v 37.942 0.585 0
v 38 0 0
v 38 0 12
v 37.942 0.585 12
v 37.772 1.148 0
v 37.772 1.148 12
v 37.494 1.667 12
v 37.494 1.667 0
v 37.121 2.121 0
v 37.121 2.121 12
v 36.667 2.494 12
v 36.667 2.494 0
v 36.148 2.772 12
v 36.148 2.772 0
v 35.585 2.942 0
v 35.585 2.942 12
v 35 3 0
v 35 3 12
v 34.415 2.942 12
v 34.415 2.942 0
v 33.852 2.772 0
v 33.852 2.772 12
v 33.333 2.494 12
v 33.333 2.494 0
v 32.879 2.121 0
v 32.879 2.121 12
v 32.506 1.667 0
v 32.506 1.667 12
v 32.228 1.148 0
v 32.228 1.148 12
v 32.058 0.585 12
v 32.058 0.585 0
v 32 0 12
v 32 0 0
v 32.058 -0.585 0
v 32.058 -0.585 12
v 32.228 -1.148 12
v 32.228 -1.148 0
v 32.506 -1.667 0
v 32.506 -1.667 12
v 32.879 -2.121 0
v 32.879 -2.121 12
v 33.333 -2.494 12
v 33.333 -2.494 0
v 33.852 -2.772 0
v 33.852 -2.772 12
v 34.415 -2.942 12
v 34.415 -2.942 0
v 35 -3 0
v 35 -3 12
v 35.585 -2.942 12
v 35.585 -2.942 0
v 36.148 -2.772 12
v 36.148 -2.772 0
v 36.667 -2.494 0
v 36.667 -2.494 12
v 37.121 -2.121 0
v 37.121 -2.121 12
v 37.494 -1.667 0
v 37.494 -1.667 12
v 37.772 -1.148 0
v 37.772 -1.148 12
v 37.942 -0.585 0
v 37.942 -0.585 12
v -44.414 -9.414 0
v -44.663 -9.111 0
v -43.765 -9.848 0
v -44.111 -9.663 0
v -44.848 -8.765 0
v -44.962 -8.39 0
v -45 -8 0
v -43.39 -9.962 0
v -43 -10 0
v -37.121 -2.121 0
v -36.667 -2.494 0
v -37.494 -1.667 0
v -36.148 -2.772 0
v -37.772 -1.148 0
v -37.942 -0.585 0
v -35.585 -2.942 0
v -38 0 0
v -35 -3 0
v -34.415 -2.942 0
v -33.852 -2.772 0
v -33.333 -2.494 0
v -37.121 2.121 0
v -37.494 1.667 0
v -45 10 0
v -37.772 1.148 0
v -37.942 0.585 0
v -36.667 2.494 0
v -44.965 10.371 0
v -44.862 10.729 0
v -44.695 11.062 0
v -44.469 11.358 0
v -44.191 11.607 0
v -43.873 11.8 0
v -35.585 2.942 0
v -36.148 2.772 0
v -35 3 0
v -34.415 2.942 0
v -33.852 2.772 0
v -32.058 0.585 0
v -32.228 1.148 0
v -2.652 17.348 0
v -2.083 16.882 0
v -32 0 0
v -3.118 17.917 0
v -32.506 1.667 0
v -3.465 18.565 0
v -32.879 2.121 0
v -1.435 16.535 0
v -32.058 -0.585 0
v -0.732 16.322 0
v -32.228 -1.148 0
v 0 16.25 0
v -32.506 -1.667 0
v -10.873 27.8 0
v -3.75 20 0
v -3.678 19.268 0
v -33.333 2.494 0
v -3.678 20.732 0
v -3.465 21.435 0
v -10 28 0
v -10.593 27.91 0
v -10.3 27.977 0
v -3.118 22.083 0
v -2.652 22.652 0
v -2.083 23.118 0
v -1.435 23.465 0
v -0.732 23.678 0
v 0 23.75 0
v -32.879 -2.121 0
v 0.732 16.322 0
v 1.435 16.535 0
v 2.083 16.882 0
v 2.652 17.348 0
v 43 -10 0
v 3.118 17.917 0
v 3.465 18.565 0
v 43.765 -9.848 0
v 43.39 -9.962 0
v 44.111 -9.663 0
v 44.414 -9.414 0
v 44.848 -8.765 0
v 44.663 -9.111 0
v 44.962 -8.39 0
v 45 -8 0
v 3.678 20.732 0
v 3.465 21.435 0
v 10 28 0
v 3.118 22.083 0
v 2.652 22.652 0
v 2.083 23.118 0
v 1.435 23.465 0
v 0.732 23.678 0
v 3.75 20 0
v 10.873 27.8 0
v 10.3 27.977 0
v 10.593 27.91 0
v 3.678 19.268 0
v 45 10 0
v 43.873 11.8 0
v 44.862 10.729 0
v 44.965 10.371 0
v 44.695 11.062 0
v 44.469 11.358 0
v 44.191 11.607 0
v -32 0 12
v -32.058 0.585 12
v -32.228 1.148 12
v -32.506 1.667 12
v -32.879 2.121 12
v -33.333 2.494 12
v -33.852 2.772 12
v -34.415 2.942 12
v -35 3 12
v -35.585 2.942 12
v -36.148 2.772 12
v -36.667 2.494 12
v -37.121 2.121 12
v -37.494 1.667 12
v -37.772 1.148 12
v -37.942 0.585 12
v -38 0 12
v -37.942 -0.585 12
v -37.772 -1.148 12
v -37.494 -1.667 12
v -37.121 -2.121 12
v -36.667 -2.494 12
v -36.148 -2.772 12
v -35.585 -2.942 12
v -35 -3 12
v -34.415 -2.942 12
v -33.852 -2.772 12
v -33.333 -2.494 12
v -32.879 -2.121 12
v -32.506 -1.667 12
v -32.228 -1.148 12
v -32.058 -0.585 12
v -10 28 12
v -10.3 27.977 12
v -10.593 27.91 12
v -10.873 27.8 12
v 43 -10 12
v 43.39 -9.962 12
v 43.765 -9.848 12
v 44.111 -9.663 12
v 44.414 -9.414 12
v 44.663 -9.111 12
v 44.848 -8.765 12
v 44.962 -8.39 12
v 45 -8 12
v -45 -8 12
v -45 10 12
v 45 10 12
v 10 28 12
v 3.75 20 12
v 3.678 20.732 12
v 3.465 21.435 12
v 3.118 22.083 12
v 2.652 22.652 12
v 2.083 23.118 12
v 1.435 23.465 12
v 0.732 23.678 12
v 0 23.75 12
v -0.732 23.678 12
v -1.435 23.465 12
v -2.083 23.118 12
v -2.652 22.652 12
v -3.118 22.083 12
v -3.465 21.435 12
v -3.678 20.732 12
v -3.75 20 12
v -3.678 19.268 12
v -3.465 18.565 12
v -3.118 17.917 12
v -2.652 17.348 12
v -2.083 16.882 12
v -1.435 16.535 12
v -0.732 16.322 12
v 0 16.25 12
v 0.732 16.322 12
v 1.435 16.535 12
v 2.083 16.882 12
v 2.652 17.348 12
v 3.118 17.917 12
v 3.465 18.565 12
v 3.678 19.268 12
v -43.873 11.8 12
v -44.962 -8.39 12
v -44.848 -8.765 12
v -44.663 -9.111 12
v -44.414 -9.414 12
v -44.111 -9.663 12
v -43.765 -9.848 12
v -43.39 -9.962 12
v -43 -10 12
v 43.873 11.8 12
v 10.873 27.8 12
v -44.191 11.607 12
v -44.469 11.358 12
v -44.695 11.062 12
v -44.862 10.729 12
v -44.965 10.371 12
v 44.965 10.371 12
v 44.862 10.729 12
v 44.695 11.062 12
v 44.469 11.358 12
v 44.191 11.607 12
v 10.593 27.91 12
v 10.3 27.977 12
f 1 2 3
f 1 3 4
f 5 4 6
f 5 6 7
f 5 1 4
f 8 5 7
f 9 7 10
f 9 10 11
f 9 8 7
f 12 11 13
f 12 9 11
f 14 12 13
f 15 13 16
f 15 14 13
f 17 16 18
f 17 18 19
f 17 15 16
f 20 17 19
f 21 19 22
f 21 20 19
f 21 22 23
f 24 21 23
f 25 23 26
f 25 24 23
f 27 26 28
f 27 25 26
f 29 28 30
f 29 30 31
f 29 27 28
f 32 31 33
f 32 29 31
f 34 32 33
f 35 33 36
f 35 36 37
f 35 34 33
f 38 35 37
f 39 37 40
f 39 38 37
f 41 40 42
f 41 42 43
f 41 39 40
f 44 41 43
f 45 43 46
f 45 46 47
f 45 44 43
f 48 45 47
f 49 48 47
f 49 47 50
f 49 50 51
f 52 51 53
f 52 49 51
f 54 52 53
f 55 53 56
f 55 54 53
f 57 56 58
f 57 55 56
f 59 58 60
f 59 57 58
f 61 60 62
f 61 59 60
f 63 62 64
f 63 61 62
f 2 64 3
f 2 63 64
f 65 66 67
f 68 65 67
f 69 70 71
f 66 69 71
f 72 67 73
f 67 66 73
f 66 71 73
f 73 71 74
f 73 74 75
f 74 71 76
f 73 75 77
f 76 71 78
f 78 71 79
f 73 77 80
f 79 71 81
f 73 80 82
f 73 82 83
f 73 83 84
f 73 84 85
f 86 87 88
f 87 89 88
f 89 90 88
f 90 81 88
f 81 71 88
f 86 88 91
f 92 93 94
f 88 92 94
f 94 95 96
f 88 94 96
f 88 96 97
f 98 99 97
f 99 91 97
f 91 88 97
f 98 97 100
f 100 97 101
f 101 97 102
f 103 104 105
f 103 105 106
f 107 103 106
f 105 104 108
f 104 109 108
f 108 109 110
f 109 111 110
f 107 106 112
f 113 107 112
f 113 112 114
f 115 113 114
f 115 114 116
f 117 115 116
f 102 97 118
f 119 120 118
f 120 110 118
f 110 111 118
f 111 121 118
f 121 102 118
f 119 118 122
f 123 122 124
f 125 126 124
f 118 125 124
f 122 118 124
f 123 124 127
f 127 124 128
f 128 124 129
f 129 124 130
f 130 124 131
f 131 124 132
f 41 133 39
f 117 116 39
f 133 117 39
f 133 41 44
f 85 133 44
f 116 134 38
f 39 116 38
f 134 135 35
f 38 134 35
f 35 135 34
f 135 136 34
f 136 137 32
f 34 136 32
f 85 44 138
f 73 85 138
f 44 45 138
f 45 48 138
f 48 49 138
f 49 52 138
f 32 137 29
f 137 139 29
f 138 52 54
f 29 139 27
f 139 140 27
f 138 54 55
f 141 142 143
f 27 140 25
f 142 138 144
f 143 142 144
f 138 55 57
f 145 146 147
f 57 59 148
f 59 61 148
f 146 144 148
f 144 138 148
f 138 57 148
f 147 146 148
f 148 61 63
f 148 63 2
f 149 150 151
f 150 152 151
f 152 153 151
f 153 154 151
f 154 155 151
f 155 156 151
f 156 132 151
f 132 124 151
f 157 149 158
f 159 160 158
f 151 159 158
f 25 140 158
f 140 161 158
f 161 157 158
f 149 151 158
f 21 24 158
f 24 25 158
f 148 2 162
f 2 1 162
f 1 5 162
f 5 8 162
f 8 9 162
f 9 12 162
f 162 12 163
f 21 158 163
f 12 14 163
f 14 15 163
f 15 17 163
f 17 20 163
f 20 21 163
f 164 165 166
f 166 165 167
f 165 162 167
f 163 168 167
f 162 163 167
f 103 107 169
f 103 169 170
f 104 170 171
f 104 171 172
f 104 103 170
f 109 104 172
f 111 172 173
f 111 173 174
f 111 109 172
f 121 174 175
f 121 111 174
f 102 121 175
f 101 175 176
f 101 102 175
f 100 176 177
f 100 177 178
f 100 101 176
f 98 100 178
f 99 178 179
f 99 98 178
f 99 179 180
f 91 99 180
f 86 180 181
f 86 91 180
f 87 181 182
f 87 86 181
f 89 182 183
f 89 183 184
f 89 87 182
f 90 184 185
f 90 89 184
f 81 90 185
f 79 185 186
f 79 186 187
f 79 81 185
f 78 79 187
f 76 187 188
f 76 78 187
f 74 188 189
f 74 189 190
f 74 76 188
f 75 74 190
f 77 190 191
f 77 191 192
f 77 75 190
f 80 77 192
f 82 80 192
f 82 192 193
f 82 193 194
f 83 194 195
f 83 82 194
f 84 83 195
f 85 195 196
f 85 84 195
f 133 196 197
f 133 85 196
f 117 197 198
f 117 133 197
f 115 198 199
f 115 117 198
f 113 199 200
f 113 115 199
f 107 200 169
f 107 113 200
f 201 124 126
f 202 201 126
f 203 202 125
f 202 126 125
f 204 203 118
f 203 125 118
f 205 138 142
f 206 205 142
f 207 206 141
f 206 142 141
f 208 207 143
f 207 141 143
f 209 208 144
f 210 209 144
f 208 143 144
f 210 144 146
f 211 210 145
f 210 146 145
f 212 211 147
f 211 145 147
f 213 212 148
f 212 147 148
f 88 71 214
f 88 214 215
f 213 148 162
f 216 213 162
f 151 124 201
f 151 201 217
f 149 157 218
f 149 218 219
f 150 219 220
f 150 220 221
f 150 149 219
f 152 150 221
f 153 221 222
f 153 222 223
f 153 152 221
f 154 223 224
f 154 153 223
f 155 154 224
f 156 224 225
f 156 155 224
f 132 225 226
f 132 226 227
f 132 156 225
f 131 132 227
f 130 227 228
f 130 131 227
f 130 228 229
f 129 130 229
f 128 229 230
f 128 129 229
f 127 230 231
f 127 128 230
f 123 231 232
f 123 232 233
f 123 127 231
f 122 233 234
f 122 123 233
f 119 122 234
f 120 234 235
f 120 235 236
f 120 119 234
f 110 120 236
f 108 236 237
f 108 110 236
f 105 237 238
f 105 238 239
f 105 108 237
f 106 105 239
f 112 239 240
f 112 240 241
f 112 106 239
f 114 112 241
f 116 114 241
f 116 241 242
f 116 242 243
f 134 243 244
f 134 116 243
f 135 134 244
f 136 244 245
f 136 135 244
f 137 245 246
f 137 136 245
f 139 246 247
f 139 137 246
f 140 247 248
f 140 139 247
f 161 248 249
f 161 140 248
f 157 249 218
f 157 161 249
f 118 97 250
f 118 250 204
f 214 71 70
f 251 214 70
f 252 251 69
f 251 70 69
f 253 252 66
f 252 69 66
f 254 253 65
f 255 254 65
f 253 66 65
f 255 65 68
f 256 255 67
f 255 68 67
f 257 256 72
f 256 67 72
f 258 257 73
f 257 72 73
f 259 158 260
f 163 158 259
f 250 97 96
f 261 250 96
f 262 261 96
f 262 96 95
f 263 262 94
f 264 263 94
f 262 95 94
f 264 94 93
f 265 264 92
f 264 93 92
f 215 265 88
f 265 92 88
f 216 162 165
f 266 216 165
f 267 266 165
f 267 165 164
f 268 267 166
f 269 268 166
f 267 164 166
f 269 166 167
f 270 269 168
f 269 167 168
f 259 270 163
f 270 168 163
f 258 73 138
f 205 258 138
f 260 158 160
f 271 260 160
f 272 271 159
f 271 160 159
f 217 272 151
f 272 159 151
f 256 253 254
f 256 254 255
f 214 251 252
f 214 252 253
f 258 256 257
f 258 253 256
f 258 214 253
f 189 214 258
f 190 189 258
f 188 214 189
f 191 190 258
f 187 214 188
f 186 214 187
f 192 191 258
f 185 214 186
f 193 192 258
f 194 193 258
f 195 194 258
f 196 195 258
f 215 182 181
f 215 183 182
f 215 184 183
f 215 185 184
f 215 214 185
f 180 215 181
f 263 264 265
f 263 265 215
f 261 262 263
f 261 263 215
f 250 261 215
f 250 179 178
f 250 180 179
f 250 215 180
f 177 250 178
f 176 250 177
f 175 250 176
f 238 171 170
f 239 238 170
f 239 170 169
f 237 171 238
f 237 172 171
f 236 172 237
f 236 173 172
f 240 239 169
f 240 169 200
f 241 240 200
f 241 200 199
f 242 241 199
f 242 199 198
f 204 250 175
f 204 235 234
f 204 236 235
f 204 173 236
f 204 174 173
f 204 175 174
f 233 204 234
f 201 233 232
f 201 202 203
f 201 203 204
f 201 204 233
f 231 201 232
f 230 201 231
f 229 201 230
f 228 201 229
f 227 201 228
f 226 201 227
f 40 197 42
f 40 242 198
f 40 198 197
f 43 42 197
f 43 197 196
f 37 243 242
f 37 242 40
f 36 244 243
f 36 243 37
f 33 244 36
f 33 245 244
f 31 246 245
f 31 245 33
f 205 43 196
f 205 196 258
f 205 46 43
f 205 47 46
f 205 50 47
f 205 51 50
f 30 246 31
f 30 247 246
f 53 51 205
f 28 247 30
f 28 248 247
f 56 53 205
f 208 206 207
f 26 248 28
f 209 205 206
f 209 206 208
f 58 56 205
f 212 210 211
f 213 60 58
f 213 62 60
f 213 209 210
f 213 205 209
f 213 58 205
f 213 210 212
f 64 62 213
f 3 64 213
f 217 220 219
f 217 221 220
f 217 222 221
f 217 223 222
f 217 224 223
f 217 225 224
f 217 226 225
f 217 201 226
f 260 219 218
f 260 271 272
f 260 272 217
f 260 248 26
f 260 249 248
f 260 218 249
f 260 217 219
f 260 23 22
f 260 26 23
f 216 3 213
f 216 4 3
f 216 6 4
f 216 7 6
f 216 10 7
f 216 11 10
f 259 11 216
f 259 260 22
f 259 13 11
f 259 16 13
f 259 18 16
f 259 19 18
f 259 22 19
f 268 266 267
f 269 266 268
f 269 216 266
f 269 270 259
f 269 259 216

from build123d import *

# Parameters (mm, degrees)
SKETCH_R   = 3
SKETCH_R_2 = 3.75
PAD_DEPTH  = 12


with BuildPart() as part:
    # Sketch → Pad (new body)
    with BuildSketch(Plane.XY):
        with BuildLine():
            Line((-43, -10), (43, -10))
            ThreePointArc((43, -10), (44.414214, -9.414214), (45, -8))
            Line((45, -8), (45, 10))
            ThreePointArc((45, 10), (44.694859, 11.061816), (43.872547, 11.799628))
            Line((10.872547, 27.799628), (43.872547, 11.799628))
            ThreePointArc((10.872547, 27.799628), (10.447629, 27.949264), (10, 28))
            Line((-10, 28), (10, 28))
            ThreePointArc((-10, 28), (-10.447629, 27.949264), (-10.872547, 27.799628))
            Line((-43.872547, 11.799628), (-10.872547, 27.799628))
            ThreePointArc((-43.872547, 11.799628), (-44.694859, 11.061816), (-45, 10))
            Line((-45, -8), (-45, 10))
            ThreePointArc((-45, -8), (-44.414214, -9.414214), (-43, -10))
        make_face()
        with Locations((-35, 0)):
            Circle(SKETCH_R, mode=Mode.SUBTRACT)
        with Locations((35, 0)):
            Circle(SKETCH_R, mode=Mode.SUBTRACT)
        with Locations((0, 20)):
            Circle(SKETCH_R_2, mode=Mode.SUBTRACT)
    extrude(amount=PAD_DEPTH)


solid = part.part
